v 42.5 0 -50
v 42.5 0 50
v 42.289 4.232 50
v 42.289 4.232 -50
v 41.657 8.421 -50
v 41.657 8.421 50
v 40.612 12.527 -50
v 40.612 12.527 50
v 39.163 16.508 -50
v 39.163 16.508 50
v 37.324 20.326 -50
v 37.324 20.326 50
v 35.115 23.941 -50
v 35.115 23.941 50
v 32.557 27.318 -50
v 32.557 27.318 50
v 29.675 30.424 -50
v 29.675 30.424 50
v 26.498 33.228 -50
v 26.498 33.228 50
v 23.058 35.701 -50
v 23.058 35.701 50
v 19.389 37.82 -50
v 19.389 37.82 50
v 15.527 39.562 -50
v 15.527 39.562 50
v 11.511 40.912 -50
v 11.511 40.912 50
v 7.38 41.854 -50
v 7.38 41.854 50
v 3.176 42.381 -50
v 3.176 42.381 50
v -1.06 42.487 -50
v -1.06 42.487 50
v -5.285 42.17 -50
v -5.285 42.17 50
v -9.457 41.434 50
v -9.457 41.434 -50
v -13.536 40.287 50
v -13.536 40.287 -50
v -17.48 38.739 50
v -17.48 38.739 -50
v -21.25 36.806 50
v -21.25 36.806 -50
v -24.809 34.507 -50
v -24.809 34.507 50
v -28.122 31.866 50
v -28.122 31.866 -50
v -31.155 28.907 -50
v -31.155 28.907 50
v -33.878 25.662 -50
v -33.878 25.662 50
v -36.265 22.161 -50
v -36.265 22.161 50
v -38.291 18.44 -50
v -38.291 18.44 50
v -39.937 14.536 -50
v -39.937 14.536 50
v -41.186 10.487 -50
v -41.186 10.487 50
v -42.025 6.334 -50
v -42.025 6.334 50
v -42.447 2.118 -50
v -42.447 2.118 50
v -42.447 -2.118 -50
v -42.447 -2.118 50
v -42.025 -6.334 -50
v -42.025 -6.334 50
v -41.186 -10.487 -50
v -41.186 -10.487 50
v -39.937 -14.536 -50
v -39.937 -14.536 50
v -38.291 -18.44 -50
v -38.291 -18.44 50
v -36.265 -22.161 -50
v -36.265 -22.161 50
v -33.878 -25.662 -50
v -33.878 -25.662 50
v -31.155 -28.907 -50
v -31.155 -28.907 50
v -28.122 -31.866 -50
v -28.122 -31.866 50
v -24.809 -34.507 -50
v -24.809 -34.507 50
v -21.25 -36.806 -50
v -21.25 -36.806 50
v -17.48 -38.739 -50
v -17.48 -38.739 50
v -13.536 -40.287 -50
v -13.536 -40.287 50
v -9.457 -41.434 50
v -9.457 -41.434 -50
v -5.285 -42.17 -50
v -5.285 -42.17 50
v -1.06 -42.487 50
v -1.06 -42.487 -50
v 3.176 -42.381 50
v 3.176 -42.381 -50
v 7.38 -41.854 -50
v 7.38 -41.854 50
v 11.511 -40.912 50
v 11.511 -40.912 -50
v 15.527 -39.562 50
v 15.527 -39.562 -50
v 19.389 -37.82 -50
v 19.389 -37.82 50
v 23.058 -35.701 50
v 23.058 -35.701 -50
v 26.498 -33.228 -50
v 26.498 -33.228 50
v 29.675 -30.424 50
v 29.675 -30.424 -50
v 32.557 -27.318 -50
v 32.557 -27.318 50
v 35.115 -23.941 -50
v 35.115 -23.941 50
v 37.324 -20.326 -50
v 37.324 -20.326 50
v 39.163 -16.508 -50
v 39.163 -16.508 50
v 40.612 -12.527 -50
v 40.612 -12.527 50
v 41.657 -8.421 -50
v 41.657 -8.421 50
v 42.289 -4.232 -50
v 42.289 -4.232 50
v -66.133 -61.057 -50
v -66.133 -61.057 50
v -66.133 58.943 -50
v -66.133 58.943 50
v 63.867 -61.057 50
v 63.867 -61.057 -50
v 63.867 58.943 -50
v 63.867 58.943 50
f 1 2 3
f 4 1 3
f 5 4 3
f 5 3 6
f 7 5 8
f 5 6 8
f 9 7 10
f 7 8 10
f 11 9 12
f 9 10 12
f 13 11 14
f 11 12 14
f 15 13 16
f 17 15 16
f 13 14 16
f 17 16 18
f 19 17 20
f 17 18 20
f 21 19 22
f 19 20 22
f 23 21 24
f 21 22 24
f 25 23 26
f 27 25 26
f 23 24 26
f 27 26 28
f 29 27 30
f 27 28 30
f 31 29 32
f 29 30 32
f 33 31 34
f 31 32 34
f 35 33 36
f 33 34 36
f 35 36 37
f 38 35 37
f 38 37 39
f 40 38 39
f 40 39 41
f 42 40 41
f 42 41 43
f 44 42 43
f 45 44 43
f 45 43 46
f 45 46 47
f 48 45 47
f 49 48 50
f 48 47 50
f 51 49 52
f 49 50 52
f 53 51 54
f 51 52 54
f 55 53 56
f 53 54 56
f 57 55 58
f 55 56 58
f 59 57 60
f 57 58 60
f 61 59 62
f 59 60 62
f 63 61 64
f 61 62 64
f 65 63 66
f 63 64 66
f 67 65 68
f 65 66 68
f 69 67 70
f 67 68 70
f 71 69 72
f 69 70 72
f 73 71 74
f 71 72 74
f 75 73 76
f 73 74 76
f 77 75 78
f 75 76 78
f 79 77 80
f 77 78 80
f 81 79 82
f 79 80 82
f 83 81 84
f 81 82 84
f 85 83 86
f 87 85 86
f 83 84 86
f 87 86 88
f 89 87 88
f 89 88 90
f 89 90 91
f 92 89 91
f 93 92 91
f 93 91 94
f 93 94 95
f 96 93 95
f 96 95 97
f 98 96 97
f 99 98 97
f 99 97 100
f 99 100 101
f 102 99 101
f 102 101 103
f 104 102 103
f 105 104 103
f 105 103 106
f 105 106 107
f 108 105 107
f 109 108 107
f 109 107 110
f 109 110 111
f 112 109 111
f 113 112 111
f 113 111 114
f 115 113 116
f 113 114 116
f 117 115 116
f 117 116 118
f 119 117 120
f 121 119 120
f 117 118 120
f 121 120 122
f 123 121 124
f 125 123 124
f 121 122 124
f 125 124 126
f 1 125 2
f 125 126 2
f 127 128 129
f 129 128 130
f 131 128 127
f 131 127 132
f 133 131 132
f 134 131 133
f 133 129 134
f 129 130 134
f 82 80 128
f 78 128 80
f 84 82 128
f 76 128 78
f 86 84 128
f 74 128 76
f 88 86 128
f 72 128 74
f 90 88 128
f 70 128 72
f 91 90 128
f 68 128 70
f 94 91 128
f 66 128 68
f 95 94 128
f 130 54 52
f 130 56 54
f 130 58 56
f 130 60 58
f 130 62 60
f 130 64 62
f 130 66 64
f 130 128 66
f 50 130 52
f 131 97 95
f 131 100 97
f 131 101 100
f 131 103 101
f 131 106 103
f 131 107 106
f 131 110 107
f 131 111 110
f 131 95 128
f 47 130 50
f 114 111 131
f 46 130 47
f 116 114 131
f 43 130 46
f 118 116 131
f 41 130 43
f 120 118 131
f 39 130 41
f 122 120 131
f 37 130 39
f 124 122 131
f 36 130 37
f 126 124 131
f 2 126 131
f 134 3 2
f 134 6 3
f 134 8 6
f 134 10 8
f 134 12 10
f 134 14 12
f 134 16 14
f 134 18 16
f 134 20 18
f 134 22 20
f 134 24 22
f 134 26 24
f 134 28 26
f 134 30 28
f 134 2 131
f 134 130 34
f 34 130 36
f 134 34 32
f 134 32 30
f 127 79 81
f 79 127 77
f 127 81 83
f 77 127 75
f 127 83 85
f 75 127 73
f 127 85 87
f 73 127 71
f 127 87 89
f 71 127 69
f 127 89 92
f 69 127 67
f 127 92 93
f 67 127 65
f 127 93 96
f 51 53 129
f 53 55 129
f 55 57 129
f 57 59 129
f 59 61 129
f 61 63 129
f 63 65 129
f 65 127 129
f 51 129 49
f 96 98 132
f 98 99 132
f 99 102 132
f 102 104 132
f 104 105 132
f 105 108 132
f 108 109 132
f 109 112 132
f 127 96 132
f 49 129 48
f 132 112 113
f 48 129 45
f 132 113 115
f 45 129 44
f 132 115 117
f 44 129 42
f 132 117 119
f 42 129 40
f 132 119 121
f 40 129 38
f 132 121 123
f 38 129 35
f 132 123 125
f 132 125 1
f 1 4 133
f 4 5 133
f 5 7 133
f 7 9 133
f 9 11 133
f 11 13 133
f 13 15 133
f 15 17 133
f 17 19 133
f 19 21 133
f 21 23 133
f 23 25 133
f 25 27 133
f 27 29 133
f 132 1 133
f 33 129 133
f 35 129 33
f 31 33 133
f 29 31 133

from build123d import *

# Parameters (mm, degrees)
F0_W     = 130
F0_H     = 120
F1_DEPTH = 50
F4_R     = 42.5
F5_DEPTH = 100


with BuildPart() as f1:
    # F0 (on Top) → F1 (new body)
    with BuildSketch(Plane.XY):
        with Locations((-1.133092, -1.057171)):
            Rectangle(F0_W, F0_H)
    extrude(amount=F1_DEPTH)

    # F2: F1 across face


with BuildPart() as f1_1:
    add(f1.part)
    add(f1.part.mirror(Plane(origin=(-1.133092, -1.057171, 0), x_dir=(1, 0, 0), z_dir=(0, 0, -1))))

    # F4 (on face) → F5 (cut)
    with BuildSketch(Plane.XY.offset(50)):
        Circle(F4_R)
    extrude(amount=-F5_DEPTH, mode=Mode.SUBTRACT)


solid = f1_1.part
